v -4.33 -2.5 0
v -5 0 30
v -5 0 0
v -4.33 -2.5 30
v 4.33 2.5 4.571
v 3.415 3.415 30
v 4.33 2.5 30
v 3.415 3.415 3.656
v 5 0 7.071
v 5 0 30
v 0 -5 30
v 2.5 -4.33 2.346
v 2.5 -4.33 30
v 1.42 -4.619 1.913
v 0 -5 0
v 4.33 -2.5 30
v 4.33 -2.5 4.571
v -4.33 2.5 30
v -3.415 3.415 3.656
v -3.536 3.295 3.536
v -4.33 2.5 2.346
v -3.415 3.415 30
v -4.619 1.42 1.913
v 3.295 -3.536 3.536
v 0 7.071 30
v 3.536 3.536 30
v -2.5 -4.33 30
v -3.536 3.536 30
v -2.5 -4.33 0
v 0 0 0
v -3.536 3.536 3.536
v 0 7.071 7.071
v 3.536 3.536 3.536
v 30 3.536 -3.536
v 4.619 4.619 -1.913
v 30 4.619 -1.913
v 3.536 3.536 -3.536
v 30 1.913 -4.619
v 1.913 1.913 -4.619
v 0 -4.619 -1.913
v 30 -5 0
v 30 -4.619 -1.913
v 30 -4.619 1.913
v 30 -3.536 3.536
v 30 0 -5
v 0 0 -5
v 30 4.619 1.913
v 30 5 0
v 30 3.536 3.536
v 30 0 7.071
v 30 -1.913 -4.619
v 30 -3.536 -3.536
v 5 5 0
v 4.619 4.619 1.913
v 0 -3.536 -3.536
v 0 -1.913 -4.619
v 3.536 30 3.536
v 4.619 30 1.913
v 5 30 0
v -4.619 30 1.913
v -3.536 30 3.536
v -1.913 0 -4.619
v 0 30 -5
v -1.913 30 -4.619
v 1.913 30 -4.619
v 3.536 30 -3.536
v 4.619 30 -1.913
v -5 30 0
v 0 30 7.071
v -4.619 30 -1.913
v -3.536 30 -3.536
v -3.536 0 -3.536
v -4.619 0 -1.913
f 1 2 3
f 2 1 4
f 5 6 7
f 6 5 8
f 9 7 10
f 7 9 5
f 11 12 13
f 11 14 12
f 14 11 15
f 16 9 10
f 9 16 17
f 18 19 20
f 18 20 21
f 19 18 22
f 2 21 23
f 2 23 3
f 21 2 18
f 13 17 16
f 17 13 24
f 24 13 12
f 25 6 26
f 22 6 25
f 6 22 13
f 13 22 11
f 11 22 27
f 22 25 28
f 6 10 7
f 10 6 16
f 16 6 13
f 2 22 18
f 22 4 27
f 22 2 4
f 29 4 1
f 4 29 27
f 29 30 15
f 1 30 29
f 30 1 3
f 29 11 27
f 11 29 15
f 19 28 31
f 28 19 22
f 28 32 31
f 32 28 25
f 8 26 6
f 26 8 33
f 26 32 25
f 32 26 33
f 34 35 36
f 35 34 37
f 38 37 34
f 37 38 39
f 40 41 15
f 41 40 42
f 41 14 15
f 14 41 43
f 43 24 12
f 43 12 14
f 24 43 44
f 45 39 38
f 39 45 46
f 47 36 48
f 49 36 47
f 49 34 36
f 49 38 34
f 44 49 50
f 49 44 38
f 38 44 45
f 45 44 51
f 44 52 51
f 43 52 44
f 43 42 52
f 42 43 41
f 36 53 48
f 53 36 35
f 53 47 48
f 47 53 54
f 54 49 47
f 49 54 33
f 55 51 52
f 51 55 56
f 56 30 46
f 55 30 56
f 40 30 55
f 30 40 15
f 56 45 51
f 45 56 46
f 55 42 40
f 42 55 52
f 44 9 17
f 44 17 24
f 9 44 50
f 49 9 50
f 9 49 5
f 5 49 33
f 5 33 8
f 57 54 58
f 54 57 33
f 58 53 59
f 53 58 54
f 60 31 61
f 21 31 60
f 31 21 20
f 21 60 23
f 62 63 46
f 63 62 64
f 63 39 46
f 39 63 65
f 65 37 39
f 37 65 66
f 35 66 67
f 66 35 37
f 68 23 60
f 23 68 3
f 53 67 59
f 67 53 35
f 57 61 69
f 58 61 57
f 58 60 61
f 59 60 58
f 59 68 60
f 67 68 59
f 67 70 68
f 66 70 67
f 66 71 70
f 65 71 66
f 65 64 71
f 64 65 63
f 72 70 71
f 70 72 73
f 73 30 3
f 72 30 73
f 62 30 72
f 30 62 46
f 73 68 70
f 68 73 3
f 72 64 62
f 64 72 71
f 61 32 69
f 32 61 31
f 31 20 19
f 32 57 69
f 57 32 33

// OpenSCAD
// Base teardrop shape, one end centred on origin, extending for given distance
// (positive or negative) along the Z axis.
//
// l = length of shape (negative extends in -z direction)
// d = diameter of hole
// q = quadrant orientation of point: 
//       0 => +x
//       1 => +y
//       2 => -x
//       3 => -y
//
module TeardropZ(l,d,q)
{
    zl = abs(l);
    zo = min(0,l);
    translate([0,0,zo])
    {
        cylinder(r=d/2,h=zl);
        rotate([0,0,-45+q*90]) cube([d/2,d/2,zl]);
    }
}

// Teardrop shape aligned along X-axis.
//
// Use for making horizontal holes in objects.
//
// l = length of shape (negative extends in -x direction)
// d = diameter of hole
// q = quadrant orientation of point: 
//       0 => +z
//       1 => +y
//       2 => -z
//       3 => -y
module TeardropX(l,d,q)
{
    rotate([0,-90,0]) TeardropZ(-l,d,q);
}

// Teardrop shape aligned along Y-axis.
//
// Use for making horizontal holes in objects.
//
// l = length of shape (negative extends in -y direction)
// d = diameter of hole
// q = quadrant orientation of point: 
//       0 => +z
//       1 => +x
//       2 => -z
//       3 => -x
module TeardropY(l,d,q)
{
    rotate([90,0,0]) TeardropZ(-l,d,-q+1);
}

// Teardrop aligned along Y axis, between given x, y, and z coordinates
// [x, y1, z] to [x, y2, z]
// Teardrop point to +Z
module teardropY2(x, y1, y2, z, r)
{
  h = y2-y1;
  translate([x,y2,z])
  {
    rotate([90,0,0])
    {
      cylinder(r=r,h=h, $fn=8);
      rotate([0,0,45])
        cube(size=[r, r, h]) ;
    }
  }
}

// Examples
TeardropZ(30,10,1,$fn=12);
TeardropX(30,10,0);
TeardropY(30,10,0);
